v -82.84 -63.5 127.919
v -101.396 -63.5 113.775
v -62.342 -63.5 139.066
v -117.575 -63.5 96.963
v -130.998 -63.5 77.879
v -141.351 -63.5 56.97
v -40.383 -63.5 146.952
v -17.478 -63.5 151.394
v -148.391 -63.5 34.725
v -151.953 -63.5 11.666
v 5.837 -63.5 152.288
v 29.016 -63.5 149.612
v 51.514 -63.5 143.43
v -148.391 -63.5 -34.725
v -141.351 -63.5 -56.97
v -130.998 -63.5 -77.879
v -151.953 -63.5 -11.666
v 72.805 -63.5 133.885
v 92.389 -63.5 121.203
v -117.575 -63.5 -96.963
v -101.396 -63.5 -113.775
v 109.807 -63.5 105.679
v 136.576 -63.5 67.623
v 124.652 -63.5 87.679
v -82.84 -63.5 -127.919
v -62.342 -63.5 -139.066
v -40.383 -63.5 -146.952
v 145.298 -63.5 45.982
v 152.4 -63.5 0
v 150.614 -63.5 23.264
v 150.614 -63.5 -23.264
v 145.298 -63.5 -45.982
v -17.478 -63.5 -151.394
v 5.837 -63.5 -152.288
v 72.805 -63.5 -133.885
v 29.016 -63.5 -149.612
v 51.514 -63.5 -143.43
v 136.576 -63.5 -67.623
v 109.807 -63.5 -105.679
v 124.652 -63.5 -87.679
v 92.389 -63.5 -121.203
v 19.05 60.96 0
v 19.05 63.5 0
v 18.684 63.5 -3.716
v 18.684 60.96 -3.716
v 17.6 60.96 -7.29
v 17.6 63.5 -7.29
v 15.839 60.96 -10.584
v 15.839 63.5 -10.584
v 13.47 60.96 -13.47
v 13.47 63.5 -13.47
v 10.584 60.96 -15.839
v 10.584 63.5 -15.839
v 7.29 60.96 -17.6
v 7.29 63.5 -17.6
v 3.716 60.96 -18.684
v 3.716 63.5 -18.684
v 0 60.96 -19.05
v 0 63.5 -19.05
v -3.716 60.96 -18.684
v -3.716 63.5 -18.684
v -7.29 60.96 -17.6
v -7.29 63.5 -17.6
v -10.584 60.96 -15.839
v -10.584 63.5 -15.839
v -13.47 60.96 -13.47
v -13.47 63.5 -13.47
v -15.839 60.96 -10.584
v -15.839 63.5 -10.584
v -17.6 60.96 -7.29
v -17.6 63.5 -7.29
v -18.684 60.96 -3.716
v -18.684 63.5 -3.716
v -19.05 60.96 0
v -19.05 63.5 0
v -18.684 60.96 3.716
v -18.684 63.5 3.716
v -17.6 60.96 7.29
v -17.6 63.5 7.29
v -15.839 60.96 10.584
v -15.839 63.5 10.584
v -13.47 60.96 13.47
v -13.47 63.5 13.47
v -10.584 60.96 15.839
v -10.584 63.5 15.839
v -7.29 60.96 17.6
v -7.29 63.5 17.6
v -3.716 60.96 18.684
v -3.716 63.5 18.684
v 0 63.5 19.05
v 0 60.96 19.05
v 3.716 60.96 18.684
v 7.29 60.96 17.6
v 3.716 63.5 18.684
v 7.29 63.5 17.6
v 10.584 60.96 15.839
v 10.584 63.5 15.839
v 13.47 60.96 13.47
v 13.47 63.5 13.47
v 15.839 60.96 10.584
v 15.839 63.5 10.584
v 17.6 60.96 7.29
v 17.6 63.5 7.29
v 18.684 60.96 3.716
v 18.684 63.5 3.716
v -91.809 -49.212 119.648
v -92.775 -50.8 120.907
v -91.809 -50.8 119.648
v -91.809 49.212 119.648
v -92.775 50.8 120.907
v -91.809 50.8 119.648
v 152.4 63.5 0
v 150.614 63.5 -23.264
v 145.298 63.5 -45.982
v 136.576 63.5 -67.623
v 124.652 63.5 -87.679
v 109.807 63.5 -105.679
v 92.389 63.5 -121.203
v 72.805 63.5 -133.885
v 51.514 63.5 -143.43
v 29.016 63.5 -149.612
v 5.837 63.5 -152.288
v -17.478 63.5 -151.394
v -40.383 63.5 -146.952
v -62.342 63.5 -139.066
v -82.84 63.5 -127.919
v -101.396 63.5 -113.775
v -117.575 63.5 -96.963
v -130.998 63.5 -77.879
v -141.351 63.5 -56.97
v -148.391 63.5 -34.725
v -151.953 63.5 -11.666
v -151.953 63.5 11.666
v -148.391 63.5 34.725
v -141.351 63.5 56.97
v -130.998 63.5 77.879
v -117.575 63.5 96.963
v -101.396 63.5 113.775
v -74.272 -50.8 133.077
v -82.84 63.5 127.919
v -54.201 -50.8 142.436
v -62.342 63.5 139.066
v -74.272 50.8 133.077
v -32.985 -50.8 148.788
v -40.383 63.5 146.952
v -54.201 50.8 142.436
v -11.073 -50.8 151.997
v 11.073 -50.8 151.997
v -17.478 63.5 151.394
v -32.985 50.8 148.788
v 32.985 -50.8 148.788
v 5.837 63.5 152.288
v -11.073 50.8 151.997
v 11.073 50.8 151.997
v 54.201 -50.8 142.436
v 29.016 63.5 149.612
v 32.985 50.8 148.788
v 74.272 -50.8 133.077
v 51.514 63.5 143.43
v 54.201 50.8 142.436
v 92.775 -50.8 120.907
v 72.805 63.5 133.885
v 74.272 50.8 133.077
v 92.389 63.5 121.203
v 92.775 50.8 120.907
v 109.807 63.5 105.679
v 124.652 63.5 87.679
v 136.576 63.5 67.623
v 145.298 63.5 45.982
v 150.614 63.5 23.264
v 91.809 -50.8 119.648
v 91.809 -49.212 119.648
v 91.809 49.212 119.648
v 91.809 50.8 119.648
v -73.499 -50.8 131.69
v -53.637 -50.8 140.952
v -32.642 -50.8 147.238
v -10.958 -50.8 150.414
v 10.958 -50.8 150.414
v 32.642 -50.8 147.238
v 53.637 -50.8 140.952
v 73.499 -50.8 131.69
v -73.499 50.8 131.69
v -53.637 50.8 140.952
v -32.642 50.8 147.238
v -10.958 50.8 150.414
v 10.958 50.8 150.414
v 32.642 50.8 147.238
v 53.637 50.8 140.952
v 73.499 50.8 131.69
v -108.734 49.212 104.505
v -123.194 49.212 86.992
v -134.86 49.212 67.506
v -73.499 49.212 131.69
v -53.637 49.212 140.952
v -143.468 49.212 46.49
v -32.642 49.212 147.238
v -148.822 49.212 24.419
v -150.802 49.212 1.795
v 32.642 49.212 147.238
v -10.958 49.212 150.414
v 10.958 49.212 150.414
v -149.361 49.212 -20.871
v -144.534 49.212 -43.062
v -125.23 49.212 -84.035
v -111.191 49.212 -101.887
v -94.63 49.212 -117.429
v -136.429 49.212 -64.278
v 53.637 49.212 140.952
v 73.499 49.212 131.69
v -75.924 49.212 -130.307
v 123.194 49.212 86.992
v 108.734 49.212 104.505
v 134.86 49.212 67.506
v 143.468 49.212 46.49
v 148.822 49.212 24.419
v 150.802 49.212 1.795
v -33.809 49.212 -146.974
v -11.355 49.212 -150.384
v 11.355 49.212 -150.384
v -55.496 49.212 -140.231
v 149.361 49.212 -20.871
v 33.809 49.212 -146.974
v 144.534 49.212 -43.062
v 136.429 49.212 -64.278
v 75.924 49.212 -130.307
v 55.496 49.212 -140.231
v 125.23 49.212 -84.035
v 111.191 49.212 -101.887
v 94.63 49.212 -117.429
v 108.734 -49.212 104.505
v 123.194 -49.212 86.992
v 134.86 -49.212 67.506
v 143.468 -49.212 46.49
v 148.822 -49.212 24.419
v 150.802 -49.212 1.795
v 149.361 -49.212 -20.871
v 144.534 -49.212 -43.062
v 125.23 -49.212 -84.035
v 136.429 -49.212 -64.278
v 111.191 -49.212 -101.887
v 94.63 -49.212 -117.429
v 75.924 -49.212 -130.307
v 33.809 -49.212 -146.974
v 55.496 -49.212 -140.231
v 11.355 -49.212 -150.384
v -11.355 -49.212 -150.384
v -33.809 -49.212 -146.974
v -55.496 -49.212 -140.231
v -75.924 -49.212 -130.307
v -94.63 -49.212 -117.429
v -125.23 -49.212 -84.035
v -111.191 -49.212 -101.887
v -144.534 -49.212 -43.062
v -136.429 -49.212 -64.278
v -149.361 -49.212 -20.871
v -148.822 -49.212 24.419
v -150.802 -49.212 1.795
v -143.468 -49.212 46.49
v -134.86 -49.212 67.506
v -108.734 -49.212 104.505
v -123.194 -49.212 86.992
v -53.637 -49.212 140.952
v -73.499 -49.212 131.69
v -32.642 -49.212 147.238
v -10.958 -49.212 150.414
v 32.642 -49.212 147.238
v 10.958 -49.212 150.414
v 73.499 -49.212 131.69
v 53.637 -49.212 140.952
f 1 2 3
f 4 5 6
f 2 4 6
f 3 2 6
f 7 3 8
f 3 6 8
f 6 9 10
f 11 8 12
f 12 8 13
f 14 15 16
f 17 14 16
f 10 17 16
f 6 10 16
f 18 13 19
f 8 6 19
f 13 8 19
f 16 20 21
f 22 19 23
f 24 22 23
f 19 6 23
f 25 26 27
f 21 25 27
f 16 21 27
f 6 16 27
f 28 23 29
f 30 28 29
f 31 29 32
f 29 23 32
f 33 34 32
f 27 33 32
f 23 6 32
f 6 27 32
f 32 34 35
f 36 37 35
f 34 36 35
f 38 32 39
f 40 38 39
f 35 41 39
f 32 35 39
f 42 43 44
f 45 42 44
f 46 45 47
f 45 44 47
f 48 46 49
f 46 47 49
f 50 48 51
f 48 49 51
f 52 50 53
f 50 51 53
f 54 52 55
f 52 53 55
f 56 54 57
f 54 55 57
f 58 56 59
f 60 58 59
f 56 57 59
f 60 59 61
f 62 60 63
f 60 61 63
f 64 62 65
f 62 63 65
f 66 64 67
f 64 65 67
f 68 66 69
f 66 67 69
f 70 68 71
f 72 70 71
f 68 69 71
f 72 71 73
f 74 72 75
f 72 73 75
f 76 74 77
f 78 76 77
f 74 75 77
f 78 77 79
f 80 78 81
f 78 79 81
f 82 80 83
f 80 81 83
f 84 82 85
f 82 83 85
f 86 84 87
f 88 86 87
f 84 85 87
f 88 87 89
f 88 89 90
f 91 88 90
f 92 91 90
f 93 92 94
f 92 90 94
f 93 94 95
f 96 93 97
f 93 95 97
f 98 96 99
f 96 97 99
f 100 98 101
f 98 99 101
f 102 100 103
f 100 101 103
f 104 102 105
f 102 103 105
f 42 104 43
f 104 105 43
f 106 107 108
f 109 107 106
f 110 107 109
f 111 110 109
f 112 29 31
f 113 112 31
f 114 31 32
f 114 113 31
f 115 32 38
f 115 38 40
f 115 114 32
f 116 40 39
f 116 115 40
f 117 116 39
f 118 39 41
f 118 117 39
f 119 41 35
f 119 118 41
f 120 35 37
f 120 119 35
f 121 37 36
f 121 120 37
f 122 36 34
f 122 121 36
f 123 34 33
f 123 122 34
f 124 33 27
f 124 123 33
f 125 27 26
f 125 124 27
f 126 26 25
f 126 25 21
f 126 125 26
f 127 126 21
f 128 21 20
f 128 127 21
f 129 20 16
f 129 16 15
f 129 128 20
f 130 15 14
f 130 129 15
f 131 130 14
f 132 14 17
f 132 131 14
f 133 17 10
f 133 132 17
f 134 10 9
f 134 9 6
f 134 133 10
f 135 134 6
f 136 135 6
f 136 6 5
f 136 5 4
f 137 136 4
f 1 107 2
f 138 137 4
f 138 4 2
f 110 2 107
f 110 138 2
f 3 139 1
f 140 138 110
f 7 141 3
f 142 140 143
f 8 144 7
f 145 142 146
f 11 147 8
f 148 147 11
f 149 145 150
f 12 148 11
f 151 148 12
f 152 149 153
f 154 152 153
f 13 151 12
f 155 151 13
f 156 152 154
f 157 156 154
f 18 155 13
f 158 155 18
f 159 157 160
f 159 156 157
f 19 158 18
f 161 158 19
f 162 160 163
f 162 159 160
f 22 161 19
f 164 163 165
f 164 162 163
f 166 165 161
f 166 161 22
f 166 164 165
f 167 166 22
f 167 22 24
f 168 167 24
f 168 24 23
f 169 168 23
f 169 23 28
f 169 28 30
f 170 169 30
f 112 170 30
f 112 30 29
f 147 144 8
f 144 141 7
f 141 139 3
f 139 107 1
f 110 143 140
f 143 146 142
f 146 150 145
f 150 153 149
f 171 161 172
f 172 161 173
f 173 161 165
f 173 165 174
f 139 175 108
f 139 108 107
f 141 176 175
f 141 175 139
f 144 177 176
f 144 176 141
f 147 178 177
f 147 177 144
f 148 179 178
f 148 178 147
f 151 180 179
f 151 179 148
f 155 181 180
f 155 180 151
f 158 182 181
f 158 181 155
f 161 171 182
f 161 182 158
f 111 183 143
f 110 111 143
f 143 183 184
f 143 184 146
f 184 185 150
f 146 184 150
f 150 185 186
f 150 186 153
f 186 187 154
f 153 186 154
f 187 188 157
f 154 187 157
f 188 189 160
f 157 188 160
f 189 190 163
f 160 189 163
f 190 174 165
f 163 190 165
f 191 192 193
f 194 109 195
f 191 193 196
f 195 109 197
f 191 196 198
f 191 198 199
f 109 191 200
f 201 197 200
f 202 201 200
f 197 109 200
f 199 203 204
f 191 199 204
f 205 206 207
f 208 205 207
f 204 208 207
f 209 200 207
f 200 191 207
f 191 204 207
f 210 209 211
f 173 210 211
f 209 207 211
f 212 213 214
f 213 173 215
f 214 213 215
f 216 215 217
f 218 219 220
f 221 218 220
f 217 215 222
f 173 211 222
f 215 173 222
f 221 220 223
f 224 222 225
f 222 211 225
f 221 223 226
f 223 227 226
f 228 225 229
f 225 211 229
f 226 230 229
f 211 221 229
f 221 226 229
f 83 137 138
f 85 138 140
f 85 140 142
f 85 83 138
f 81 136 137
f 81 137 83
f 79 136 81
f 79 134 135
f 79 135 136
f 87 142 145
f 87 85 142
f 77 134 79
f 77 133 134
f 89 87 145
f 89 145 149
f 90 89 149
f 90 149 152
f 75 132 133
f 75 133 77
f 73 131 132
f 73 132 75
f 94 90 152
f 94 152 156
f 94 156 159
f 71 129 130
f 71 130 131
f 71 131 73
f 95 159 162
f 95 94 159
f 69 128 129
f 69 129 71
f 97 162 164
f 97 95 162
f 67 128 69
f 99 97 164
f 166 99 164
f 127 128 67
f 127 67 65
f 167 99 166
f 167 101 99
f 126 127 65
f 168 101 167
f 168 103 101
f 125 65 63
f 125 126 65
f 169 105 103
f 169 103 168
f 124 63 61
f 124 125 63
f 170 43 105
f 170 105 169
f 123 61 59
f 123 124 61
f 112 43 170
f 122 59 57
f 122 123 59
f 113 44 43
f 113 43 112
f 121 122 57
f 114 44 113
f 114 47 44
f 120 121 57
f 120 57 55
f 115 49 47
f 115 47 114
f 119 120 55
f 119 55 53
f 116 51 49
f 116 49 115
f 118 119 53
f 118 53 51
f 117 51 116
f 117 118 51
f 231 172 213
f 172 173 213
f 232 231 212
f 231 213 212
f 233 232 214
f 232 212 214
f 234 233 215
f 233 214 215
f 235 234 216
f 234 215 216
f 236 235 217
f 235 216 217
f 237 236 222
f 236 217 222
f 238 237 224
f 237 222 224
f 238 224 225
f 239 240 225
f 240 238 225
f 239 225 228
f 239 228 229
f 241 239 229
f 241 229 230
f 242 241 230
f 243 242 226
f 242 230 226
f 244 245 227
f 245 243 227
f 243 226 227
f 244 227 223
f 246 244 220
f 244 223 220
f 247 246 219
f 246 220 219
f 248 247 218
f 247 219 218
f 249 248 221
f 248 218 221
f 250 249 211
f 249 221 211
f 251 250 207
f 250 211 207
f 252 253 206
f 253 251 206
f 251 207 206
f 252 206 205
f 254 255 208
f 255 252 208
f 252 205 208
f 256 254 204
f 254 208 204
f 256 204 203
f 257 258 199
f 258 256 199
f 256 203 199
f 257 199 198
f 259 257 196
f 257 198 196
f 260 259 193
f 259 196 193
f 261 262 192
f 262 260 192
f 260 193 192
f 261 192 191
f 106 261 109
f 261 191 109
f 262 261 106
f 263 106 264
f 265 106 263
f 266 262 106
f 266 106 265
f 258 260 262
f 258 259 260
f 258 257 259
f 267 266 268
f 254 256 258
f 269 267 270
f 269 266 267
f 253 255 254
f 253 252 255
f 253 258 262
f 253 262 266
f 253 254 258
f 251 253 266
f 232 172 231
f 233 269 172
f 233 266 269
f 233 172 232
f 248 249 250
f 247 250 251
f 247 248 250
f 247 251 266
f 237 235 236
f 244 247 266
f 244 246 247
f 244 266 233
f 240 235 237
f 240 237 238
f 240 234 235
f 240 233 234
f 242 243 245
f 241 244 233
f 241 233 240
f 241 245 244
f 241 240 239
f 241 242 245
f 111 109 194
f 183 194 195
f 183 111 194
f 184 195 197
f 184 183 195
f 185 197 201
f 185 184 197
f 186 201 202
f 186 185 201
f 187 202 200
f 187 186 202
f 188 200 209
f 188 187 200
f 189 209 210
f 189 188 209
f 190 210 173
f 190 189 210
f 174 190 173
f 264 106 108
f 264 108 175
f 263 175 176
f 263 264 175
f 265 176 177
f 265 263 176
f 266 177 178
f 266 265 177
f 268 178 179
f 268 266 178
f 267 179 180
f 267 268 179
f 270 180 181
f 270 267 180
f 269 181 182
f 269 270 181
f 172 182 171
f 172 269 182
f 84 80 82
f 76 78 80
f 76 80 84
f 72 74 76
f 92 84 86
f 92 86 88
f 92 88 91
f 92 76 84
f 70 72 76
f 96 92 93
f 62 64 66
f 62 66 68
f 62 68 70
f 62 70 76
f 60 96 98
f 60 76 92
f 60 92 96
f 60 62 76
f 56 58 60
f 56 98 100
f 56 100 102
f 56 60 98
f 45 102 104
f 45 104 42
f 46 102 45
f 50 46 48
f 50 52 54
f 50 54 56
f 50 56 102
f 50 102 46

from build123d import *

# Parameters (mm, degrees)
SKETCH1_R           = 152.4
BOSS_EXTRUDE1_DEPTH = 63.5
SKETCH2_R           = 150.8125
CUT_EXTRUDE1_DEPTH  = 49.2125
SKETCH3_W           = 1.5875
SKETCH3_H           = 101.6
CUT_REVOLVE1_ANGLE  = 75
SKETCH4_R           = 19.05
CUT_EXTRUDE2_DEPTH  = 2.54


with BuildPart() as part:
    # Sketch1 → Boss-Extrude1 (new body, symmetric)
    with BuildSketch(Plane(origin=(0, 0, 0), x_dir=(1, 0, 0), z_dir=(0, 1, 0))):
        Circle(SKETCH1_R)
    extrude(amount=BOSS_EXTRUDE1_DEPTH, both=True)

    # Sketch2 → Cut-Extrude1 (cut, symmetric)
    with BuildSketch(Plane(origin=(0, 0, 0), x_dir=(1, 0, 0), z_dir=(0, 1, 0))):
        Circle(SKETCH2_R)
    extrude(amount=CUT_EXTRUDE1_DEPTH, both=True, mode=Mode.SUBTRACT)

    # Sketch3 → Cut-Revolve1 (revolve, symmetric, cut)
    with BuildSketch(Plane(origin=(0, 0, 0), x_dir=(0, 0, -1), z_dir=(1, 0, 0))) as cut_revolve1_sk:
        with Locations((-151.60625, 0)):
            Rectangle(SKETCH3_W, SKETCH3_H)
    revolve(axis=Axis((0, 0, 0), (0, 1, 0)), revolution_arc=CUT_REVOLVE1_ANGLE / 2, mode=Mode.SUBTRACT)
    revolve(cut_revolve1_sk.sketch, axis=Axis((0, 0, 0), (0, -1, 0)), revolution_arc=CUT_REVOLVE1_ANGLE / 2, mode=Mode.SUBTRACT)

    # Sketch4 → Cut-Extrude2 (cut)
    with BuildSketch(Plane(origin=(0, 63.5, 0), x_dir=(1, 0, 0), z_dir=(0, 1, 0))):
        Circle(SKETCH4_R)
    extrude(amount=-CUT_EXTRUDE2_DEPTH, mode=Mode.SUBTRACT)


solid = part.part
